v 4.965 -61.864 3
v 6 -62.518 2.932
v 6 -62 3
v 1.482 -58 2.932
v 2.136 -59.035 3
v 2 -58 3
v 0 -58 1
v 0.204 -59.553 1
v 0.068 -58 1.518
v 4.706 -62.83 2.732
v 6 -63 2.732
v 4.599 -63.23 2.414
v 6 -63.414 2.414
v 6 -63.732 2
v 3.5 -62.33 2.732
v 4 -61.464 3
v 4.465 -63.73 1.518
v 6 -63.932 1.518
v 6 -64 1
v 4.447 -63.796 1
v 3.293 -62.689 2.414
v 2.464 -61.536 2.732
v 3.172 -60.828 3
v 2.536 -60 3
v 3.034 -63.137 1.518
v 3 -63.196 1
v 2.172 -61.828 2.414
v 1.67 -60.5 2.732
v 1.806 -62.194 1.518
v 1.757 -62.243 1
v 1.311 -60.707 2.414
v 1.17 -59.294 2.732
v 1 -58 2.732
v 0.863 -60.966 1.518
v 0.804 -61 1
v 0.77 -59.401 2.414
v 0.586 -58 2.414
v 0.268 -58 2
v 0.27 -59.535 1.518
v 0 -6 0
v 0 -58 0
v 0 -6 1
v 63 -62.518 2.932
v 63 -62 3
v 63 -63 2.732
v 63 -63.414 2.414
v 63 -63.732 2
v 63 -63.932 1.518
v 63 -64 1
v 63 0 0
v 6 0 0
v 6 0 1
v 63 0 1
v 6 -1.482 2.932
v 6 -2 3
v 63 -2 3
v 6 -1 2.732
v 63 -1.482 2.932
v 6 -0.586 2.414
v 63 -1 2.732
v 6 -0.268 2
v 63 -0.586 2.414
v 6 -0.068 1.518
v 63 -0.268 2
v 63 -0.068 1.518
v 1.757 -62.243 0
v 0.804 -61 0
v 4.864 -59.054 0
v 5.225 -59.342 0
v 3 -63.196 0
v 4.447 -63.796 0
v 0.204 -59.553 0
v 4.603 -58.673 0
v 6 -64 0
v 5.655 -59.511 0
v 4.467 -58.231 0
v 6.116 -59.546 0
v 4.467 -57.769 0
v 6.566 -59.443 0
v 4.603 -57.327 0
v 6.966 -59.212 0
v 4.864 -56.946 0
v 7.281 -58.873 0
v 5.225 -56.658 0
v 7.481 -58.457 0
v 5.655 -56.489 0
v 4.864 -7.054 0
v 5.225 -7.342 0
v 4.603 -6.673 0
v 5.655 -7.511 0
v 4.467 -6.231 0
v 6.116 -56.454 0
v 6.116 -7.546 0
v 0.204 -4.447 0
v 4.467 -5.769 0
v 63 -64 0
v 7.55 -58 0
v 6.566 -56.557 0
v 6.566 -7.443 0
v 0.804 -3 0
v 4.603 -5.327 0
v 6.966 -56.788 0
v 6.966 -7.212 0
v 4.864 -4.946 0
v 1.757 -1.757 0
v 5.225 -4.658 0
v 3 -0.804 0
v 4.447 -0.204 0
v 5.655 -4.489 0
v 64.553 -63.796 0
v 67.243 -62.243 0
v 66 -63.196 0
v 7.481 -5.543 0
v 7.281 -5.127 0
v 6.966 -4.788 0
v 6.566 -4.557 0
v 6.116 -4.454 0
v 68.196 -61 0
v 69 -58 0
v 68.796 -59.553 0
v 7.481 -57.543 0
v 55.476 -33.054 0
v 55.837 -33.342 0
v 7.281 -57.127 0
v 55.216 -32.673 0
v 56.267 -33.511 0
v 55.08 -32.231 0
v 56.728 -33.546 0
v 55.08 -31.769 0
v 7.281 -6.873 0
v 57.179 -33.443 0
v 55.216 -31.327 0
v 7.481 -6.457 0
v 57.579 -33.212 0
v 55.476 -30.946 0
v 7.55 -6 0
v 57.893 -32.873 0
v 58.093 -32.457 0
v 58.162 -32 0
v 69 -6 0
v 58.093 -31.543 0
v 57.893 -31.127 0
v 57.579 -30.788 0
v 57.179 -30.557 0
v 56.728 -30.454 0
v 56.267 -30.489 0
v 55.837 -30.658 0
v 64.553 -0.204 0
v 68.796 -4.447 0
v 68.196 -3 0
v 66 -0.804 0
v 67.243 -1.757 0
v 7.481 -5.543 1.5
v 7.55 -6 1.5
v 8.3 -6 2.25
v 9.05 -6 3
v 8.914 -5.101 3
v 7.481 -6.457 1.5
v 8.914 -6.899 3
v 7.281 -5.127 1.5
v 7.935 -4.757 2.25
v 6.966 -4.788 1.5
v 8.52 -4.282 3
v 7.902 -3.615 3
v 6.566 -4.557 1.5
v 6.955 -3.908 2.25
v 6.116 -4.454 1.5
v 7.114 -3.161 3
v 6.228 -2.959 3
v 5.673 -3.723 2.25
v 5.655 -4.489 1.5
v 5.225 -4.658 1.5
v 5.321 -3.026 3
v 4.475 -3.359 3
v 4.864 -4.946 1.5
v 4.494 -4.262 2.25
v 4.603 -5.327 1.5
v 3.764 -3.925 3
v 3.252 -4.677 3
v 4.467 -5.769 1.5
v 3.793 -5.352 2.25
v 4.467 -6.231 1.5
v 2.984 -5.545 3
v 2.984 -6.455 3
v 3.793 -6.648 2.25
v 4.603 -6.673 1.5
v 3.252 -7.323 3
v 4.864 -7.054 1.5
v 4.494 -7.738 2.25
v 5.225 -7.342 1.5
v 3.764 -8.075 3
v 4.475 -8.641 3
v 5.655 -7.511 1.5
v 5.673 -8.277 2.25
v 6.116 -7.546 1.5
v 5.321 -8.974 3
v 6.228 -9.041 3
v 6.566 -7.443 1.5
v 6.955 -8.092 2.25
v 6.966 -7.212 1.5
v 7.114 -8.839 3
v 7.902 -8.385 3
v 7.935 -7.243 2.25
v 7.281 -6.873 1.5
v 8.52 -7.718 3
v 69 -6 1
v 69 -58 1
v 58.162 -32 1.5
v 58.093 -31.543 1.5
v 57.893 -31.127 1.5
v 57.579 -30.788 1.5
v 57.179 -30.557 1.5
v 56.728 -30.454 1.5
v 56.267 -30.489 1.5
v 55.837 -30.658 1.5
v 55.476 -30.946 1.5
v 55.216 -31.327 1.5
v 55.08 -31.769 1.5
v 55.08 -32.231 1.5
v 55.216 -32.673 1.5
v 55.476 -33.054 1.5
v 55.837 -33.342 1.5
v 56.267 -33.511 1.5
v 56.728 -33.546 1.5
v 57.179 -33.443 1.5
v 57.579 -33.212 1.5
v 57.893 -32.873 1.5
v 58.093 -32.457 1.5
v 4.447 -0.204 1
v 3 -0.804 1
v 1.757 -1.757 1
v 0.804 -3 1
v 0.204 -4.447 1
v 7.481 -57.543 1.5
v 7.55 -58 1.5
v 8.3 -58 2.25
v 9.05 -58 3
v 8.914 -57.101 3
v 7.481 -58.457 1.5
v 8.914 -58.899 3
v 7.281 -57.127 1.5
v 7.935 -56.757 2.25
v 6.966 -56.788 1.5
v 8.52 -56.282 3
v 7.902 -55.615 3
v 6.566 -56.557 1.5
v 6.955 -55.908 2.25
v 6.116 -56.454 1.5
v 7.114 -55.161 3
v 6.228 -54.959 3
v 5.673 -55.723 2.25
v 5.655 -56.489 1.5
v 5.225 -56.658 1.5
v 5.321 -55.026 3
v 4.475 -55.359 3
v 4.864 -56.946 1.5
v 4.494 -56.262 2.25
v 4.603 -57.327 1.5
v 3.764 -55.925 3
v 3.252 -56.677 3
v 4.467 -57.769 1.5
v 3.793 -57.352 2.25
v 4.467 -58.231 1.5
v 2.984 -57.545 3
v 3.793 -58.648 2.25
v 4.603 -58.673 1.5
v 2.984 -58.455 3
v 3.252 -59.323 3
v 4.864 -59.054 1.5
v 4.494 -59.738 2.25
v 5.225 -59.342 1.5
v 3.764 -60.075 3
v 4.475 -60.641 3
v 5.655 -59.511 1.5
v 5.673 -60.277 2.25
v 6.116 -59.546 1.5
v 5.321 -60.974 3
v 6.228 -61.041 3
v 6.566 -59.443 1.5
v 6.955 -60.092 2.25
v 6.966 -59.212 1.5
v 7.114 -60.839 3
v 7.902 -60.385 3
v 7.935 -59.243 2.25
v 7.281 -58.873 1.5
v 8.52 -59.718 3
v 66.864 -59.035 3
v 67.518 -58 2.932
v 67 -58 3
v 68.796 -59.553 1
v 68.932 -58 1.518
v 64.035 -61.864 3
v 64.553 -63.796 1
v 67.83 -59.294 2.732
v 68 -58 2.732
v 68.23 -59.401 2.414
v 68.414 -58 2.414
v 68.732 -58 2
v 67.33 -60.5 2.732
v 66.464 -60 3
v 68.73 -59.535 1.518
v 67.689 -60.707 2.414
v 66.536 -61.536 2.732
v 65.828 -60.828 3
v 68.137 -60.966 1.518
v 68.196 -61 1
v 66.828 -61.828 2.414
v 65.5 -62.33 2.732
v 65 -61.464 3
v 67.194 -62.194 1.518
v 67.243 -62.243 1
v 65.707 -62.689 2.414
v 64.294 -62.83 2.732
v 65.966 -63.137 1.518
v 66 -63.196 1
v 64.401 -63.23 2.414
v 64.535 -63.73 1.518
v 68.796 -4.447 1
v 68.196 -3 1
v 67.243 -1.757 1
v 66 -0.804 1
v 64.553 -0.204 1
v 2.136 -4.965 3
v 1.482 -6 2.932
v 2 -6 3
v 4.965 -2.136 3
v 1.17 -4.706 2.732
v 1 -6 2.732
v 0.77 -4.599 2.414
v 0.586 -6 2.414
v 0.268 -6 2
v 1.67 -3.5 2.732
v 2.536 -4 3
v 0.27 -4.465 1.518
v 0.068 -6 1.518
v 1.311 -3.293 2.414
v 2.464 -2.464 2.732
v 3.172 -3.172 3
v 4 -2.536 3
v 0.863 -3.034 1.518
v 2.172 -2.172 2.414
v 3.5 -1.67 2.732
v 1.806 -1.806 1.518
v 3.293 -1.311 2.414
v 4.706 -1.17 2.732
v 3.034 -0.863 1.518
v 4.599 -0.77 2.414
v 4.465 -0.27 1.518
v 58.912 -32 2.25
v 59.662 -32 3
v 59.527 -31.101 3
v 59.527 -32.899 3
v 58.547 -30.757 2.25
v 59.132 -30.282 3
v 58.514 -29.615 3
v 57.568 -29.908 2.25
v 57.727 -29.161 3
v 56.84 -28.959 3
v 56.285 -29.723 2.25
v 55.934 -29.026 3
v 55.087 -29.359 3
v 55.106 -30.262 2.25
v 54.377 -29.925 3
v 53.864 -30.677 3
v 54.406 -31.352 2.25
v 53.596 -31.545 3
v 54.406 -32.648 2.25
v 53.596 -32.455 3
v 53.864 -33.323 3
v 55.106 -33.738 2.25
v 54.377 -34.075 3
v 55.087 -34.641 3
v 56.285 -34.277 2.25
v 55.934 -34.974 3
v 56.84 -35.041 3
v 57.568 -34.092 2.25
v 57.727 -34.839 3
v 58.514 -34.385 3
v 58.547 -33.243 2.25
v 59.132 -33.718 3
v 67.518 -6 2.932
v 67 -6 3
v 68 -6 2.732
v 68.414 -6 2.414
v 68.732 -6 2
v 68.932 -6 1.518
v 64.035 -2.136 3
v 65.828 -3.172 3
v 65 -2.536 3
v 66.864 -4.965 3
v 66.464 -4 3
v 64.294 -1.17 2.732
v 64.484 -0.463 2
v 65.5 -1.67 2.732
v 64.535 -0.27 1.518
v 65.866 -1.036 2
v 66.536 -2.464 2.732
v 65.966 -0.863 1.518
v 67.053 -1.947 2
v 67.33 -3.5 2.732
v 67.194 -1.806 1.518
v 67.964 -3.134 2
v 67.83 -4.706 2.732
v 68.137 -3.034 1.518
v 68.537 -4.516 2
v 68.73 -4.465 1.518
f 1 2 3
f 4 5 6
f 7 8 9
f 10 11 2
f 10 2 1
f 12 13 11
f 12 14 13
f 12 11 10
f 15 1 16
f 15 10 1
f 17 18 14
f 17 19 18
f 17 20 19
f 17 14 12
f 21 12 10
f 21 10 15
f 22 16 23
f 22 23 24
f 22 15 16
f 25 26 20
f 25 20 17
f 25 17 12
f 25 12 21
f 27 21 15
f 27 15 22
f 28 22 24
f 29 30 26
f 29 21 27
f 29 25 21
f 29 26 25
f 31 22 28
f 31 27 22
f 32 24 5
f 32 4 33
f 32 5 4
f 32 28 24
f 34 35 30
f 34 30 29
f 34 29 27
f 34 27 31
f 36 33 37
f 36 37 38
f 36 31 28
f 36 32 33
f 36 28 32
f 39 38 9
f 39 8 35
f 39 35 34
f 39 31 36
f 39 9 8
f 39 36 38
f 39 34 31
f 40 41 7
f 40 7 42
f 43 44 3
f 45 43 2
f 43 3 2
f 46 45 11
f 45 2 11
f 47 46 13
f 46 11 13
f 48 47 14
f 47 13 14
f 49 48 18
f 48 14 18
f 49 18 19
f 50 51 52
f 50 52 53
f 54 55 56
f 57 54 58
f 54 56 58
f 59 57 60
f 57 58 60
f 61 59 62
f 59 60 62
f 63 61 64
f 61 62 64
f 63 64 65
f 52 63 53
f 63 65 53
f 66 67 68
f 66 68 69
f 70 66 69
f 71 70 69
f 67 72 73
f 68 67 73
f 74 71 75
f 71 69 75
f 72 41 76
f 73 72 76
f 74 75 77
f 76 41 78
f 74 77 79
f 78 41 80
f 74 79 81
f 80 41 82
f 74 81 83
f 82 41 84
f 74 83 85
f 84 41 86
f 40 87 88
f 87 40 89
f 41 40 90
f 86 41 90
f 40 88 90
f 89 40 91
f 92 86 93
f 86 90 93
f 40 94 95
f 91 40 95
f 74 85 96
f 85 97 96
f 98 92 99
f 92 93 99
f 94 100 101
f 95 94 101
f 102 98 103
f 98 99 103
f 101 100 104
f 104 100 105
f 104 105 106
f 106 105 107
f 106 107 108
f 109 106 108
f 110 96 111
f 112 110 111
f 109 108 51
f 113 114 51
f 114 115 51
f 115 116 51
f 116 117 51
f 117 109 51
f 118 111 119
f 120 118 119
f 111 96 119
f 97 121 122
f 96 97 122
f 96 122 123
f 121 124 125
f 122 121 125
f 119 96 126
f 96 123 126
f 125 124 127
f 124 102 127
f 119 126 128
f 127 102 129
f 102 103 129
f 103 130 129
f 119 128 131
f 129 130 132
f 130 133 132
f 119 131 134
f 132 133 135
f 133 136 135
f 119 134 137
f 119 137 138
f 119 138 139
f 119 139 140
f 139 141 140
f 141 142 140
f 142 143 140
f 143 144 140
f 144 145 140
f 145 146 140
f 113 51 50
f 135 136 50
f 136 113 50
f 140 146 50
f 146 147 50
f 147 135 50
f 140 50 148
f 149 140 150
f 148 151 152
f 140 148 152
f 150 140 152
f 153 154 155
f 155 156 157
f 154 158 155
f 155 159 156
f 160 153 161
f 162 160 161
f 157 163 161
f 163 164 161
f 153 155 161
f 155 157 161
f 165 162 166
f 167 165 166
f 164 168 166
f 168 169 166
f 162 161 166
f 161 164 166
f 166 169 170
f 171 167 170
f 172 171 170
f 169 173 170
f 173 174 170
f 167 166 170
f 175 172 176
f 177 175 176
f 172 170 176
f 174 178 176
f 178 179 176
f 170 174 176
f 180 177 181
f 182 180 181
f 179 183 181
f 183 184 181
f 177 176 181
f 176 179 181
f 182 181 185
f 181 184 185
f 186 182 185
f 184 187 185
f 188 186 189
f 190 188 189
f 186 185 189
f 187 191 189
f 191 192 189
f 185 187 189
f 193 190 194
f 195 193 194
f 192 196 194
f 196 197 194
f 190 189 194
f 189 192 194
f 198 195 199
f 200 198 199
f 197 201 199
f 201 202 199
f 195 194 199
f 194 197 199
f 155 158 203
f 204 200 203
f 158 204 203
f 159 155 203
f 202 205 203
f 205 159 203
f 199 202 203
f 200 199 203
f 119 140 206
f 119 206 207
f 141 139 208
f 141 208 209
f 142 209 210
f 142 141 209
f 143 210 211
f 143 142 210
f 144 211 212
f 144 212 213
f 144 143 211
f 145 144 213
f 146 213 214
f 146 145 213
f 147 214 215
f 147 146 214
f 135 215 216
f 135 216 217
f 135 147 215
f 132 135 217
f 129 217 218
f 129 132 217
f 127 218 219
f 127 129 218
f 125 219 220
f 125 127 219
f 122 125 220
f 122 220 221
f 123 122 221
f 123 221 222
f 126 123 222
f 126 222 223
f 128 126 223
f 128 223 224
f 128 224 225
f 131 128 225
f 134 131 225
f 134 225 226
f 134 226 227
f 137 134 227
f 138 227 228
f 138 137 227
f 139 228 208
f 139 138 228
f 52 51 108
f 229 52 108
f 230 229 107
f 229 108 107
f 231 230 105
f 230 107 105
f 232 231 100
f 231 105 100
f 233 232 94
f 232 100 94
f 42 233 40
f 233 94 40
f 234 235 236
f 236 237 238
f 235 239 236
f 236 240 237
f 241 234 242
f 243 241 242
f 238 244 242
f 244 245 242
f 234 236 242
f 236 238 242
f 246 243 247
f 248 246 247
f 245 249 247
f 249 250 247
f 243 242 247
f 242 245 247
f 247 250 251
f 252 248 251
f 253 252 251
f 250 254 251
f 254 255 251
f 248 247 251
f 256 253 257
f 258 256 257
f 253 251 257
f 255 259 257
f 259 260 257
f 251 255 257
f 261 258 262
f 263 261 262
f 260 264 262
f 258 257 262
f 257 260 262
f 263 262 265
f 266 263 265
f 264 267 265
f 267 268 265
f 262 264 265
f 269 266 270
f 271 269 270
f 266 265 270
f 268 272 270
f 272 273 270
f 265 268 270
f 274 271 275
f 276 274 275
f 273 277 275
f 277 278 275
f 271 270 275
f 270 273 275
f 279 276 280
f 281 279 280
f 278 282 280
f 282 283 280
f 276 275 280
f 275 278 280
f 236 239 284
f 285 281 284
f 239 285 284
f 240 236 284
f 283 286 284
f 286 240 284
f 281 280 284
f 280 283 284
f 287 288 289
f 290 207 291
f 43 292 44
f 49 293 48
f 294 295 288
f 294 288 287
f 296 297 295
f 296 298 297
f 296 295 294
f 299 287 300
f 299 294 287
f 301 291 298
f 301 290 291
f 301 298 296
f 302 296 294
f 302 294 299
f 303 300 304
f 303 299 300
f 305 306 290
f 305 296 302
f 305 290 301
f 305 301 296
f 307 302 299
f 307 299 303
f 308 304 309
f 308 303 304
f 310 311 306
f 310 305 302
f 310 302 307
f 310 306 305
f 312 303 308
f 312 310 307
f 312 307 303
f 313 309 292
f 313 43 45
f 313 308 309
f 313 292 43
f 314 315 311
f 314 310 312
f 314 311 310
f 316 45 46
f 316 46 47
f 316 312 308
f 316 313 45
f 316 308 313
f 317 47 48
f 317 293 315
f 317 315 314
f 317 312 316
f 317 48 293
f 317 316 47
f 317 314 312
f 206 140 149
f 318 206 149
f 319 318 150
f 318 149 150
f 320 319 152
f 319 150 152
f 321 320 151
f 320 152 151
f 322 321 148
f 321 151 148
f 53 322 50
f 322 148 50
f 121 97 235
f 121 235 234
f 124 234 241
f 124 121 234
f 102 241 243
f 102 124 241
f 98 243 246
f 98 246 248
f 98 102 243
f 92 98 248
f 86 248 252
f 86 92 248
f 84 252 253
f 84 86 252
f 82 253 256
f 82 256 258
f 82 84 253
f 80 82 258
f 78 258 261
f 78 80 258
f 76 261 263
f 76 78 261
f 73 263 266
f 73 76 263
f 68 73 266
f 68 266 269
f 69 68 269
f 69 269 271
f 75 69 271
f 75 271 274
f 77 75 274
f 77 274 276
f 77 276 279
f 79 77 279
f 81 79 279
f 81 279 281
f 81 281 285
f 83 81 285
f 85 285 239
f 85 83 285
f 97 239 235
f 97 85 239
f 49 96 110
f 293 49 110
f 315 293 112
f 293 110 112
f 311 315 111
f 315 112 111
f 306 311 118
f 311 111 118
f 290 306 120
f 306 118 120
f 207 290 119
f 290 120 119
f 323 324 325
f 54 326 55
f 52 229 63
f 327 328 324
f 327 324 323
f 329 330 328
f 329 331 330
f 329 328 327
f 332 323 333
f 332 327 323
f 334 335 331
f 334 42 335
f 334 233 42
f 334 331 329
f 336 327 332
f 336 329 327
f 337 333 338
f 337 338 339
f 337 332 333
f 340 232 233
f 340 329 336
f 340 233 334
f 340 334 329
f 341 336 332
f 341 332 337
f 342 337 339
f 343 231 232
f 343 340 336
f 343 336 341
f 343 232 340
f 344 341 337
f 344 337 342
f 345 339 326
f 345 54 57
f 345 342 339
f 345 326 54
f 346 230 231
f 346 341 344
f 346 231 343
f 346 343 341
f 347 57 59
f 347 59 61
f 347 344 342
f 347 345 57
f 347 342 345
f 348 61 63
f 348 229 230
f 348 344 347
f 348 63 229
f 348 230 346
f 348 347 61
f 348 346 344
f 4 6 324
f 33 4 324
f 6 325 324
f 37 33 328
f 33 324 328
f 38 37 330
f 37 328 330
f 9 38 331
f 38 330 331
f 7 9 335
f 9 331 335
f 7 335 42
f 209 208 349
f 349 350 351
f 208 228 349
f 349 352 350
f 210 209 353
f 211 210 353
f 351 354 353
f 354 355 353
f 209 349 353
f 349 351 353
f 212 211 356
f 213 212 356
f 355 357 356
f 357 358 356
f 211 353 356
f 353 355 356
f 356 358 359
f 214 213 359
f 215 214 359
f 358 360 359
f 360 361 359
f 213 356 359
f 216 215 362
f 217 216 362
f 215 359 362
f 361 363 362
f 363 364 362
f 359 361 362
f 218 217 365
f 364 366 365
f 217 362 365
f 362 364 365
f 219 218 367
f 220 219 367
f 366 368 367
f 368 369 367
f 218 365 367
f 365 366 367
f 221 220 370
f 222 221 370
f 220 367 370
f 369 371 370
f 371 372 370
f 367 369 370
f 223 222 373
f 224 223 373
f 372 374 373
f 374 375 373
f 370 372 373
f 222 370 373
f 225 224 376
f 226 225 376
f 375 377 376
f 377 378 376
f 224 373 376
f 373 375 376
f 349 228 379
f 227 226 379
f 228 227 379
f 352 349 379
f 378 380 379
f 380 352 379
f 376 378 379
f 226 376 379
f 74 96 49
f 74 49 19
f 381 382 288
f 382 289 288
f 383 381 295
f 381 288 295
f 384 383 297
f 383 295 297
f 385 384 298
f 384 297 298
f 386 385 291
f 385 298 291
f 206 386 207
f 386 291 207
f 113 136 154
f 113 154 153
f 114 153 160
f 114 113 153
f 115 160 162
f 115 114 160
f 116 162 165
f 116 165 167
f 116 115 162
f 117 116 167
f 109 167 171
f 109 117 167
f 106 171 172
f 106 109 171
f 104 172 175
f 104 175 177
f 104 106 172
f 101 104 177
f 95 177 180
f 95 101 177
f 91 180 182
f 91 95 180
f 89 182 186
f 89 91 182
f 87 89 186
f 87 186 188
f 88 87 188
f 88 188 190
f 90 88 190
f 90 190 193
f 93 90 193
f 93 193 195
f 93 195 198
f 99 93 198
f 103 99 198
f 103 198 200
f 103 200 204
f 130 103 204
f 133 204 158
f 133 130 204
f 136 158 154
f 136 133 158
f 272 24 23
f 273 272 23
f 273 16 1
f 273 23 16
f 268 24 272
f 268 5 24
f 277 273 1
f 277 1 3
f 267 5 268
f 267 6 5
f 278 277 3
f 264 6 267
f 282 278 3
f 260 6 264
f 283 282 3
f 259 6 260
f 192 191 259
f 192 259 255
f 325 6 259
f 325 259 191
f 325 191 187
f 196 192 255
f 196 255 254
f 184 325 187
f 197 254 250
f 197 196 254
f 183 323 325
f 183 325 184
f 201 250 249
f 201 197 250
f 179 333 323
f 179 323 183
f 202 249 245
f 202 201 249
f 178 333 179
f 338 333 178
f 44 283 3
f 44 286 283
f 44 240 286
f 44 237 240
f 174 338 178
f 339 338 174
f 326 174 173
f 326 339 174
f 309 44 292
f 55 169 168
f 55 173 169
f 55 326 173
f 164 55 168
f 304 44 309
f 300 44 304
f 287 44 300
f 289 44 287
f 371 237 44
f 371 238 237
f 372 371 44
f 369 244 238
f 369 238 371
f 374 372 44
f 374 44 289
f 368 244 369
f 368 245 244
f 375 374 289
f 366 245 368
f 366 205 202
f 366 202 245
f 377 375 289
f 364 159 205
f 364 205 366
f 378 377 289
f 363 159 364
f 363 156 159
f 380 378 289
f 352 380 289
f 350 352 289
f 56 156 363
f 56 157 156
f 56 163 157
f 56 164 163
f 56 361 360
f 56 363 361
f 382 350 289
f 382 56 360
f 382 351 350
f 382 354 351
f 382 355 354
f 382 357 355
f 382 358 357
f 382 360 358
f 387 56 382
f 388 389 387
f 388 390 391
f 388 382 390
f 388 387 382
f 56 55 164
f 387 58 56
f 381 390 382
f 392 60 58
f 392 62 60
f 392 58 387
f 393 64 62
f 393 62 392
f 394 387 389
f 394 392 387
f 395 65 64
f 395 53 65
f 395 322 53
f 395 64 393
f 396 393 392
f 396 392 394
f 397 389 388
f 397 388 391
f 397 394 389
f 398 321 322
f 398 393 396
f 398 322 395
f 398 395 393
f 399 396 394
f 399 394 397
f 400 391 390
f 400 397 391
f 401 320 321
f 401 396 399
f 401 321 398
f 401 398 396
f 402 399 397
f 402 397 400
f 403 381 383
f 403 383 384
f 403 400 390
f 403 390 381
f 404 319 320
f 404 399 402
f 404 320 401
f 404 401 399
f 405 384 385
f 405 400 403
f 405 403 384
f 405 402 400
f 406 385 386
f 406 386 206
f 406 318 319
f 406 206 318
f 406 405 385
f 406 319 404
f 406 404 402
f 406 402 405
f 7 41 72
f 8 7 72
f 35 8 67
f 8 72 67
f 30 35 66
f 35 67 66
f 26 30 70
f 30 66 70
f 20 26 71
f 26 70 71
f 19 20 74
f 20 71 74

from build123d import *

# Parameters (mm, degrees)
SKETCH_R     = 1.55
PAD_DEPTH    = 3
CHAMFER_SIZE = 1.5
FILLET_R     = 2


with BuildPart() as part:
    # Sketch → Pad (new body)
    with BuildSketch(Plane.XY):
        with BuildLine():
            ThreePointArc((6, 0), (1.757359, -1.757359), (0, -6))
            Line((0, -58), (0, -6))
            ThreePointArc((0, -58), (1.757359, -62.242641), (6, -64))
            Line((63, -64), (6, -64))
            ThreePointArc((63, -64), (67.242641, -62.242641), (69, -58))
            Line((69, -6), (69, -58))
            ThreePointArc((69, -6), (67.242641, -1.757359), (63, 0))
            Line((6, 0), (63, 0))
        make_face()
        with Locations((6, -6)):
            Circle(SKETCH_R, mode=Mode.SUBTRACT)
        with Locations((6, -58)):
            Circle(SKETCH_R, mode=Mode.SUBTRACT)
        with Locations((56.61235, -32)):
            Circle(SKETCH_R, mode=Mode.SUBTRACT)
    extrude(amount=PAD_DEPTH)

    # Chamfer
    chamfer_edges = [part.edges().sort_by_distance(p)[0] for p in [
        (4.45, -6, 3),
        (4.45, -58, 3),
        (55.06235, -32, 3),
    ]]
    chamfer(chamfer_edges, length=CHAMFER_SIZE)

    # Fillet
    fillet_edges = [part.edges().sort_by_distance(p)[0] for p in [
        (69, -32, 3),
    ]]
    fillet(fillet_edges, radius=FILLET_R)


solid = part.part
